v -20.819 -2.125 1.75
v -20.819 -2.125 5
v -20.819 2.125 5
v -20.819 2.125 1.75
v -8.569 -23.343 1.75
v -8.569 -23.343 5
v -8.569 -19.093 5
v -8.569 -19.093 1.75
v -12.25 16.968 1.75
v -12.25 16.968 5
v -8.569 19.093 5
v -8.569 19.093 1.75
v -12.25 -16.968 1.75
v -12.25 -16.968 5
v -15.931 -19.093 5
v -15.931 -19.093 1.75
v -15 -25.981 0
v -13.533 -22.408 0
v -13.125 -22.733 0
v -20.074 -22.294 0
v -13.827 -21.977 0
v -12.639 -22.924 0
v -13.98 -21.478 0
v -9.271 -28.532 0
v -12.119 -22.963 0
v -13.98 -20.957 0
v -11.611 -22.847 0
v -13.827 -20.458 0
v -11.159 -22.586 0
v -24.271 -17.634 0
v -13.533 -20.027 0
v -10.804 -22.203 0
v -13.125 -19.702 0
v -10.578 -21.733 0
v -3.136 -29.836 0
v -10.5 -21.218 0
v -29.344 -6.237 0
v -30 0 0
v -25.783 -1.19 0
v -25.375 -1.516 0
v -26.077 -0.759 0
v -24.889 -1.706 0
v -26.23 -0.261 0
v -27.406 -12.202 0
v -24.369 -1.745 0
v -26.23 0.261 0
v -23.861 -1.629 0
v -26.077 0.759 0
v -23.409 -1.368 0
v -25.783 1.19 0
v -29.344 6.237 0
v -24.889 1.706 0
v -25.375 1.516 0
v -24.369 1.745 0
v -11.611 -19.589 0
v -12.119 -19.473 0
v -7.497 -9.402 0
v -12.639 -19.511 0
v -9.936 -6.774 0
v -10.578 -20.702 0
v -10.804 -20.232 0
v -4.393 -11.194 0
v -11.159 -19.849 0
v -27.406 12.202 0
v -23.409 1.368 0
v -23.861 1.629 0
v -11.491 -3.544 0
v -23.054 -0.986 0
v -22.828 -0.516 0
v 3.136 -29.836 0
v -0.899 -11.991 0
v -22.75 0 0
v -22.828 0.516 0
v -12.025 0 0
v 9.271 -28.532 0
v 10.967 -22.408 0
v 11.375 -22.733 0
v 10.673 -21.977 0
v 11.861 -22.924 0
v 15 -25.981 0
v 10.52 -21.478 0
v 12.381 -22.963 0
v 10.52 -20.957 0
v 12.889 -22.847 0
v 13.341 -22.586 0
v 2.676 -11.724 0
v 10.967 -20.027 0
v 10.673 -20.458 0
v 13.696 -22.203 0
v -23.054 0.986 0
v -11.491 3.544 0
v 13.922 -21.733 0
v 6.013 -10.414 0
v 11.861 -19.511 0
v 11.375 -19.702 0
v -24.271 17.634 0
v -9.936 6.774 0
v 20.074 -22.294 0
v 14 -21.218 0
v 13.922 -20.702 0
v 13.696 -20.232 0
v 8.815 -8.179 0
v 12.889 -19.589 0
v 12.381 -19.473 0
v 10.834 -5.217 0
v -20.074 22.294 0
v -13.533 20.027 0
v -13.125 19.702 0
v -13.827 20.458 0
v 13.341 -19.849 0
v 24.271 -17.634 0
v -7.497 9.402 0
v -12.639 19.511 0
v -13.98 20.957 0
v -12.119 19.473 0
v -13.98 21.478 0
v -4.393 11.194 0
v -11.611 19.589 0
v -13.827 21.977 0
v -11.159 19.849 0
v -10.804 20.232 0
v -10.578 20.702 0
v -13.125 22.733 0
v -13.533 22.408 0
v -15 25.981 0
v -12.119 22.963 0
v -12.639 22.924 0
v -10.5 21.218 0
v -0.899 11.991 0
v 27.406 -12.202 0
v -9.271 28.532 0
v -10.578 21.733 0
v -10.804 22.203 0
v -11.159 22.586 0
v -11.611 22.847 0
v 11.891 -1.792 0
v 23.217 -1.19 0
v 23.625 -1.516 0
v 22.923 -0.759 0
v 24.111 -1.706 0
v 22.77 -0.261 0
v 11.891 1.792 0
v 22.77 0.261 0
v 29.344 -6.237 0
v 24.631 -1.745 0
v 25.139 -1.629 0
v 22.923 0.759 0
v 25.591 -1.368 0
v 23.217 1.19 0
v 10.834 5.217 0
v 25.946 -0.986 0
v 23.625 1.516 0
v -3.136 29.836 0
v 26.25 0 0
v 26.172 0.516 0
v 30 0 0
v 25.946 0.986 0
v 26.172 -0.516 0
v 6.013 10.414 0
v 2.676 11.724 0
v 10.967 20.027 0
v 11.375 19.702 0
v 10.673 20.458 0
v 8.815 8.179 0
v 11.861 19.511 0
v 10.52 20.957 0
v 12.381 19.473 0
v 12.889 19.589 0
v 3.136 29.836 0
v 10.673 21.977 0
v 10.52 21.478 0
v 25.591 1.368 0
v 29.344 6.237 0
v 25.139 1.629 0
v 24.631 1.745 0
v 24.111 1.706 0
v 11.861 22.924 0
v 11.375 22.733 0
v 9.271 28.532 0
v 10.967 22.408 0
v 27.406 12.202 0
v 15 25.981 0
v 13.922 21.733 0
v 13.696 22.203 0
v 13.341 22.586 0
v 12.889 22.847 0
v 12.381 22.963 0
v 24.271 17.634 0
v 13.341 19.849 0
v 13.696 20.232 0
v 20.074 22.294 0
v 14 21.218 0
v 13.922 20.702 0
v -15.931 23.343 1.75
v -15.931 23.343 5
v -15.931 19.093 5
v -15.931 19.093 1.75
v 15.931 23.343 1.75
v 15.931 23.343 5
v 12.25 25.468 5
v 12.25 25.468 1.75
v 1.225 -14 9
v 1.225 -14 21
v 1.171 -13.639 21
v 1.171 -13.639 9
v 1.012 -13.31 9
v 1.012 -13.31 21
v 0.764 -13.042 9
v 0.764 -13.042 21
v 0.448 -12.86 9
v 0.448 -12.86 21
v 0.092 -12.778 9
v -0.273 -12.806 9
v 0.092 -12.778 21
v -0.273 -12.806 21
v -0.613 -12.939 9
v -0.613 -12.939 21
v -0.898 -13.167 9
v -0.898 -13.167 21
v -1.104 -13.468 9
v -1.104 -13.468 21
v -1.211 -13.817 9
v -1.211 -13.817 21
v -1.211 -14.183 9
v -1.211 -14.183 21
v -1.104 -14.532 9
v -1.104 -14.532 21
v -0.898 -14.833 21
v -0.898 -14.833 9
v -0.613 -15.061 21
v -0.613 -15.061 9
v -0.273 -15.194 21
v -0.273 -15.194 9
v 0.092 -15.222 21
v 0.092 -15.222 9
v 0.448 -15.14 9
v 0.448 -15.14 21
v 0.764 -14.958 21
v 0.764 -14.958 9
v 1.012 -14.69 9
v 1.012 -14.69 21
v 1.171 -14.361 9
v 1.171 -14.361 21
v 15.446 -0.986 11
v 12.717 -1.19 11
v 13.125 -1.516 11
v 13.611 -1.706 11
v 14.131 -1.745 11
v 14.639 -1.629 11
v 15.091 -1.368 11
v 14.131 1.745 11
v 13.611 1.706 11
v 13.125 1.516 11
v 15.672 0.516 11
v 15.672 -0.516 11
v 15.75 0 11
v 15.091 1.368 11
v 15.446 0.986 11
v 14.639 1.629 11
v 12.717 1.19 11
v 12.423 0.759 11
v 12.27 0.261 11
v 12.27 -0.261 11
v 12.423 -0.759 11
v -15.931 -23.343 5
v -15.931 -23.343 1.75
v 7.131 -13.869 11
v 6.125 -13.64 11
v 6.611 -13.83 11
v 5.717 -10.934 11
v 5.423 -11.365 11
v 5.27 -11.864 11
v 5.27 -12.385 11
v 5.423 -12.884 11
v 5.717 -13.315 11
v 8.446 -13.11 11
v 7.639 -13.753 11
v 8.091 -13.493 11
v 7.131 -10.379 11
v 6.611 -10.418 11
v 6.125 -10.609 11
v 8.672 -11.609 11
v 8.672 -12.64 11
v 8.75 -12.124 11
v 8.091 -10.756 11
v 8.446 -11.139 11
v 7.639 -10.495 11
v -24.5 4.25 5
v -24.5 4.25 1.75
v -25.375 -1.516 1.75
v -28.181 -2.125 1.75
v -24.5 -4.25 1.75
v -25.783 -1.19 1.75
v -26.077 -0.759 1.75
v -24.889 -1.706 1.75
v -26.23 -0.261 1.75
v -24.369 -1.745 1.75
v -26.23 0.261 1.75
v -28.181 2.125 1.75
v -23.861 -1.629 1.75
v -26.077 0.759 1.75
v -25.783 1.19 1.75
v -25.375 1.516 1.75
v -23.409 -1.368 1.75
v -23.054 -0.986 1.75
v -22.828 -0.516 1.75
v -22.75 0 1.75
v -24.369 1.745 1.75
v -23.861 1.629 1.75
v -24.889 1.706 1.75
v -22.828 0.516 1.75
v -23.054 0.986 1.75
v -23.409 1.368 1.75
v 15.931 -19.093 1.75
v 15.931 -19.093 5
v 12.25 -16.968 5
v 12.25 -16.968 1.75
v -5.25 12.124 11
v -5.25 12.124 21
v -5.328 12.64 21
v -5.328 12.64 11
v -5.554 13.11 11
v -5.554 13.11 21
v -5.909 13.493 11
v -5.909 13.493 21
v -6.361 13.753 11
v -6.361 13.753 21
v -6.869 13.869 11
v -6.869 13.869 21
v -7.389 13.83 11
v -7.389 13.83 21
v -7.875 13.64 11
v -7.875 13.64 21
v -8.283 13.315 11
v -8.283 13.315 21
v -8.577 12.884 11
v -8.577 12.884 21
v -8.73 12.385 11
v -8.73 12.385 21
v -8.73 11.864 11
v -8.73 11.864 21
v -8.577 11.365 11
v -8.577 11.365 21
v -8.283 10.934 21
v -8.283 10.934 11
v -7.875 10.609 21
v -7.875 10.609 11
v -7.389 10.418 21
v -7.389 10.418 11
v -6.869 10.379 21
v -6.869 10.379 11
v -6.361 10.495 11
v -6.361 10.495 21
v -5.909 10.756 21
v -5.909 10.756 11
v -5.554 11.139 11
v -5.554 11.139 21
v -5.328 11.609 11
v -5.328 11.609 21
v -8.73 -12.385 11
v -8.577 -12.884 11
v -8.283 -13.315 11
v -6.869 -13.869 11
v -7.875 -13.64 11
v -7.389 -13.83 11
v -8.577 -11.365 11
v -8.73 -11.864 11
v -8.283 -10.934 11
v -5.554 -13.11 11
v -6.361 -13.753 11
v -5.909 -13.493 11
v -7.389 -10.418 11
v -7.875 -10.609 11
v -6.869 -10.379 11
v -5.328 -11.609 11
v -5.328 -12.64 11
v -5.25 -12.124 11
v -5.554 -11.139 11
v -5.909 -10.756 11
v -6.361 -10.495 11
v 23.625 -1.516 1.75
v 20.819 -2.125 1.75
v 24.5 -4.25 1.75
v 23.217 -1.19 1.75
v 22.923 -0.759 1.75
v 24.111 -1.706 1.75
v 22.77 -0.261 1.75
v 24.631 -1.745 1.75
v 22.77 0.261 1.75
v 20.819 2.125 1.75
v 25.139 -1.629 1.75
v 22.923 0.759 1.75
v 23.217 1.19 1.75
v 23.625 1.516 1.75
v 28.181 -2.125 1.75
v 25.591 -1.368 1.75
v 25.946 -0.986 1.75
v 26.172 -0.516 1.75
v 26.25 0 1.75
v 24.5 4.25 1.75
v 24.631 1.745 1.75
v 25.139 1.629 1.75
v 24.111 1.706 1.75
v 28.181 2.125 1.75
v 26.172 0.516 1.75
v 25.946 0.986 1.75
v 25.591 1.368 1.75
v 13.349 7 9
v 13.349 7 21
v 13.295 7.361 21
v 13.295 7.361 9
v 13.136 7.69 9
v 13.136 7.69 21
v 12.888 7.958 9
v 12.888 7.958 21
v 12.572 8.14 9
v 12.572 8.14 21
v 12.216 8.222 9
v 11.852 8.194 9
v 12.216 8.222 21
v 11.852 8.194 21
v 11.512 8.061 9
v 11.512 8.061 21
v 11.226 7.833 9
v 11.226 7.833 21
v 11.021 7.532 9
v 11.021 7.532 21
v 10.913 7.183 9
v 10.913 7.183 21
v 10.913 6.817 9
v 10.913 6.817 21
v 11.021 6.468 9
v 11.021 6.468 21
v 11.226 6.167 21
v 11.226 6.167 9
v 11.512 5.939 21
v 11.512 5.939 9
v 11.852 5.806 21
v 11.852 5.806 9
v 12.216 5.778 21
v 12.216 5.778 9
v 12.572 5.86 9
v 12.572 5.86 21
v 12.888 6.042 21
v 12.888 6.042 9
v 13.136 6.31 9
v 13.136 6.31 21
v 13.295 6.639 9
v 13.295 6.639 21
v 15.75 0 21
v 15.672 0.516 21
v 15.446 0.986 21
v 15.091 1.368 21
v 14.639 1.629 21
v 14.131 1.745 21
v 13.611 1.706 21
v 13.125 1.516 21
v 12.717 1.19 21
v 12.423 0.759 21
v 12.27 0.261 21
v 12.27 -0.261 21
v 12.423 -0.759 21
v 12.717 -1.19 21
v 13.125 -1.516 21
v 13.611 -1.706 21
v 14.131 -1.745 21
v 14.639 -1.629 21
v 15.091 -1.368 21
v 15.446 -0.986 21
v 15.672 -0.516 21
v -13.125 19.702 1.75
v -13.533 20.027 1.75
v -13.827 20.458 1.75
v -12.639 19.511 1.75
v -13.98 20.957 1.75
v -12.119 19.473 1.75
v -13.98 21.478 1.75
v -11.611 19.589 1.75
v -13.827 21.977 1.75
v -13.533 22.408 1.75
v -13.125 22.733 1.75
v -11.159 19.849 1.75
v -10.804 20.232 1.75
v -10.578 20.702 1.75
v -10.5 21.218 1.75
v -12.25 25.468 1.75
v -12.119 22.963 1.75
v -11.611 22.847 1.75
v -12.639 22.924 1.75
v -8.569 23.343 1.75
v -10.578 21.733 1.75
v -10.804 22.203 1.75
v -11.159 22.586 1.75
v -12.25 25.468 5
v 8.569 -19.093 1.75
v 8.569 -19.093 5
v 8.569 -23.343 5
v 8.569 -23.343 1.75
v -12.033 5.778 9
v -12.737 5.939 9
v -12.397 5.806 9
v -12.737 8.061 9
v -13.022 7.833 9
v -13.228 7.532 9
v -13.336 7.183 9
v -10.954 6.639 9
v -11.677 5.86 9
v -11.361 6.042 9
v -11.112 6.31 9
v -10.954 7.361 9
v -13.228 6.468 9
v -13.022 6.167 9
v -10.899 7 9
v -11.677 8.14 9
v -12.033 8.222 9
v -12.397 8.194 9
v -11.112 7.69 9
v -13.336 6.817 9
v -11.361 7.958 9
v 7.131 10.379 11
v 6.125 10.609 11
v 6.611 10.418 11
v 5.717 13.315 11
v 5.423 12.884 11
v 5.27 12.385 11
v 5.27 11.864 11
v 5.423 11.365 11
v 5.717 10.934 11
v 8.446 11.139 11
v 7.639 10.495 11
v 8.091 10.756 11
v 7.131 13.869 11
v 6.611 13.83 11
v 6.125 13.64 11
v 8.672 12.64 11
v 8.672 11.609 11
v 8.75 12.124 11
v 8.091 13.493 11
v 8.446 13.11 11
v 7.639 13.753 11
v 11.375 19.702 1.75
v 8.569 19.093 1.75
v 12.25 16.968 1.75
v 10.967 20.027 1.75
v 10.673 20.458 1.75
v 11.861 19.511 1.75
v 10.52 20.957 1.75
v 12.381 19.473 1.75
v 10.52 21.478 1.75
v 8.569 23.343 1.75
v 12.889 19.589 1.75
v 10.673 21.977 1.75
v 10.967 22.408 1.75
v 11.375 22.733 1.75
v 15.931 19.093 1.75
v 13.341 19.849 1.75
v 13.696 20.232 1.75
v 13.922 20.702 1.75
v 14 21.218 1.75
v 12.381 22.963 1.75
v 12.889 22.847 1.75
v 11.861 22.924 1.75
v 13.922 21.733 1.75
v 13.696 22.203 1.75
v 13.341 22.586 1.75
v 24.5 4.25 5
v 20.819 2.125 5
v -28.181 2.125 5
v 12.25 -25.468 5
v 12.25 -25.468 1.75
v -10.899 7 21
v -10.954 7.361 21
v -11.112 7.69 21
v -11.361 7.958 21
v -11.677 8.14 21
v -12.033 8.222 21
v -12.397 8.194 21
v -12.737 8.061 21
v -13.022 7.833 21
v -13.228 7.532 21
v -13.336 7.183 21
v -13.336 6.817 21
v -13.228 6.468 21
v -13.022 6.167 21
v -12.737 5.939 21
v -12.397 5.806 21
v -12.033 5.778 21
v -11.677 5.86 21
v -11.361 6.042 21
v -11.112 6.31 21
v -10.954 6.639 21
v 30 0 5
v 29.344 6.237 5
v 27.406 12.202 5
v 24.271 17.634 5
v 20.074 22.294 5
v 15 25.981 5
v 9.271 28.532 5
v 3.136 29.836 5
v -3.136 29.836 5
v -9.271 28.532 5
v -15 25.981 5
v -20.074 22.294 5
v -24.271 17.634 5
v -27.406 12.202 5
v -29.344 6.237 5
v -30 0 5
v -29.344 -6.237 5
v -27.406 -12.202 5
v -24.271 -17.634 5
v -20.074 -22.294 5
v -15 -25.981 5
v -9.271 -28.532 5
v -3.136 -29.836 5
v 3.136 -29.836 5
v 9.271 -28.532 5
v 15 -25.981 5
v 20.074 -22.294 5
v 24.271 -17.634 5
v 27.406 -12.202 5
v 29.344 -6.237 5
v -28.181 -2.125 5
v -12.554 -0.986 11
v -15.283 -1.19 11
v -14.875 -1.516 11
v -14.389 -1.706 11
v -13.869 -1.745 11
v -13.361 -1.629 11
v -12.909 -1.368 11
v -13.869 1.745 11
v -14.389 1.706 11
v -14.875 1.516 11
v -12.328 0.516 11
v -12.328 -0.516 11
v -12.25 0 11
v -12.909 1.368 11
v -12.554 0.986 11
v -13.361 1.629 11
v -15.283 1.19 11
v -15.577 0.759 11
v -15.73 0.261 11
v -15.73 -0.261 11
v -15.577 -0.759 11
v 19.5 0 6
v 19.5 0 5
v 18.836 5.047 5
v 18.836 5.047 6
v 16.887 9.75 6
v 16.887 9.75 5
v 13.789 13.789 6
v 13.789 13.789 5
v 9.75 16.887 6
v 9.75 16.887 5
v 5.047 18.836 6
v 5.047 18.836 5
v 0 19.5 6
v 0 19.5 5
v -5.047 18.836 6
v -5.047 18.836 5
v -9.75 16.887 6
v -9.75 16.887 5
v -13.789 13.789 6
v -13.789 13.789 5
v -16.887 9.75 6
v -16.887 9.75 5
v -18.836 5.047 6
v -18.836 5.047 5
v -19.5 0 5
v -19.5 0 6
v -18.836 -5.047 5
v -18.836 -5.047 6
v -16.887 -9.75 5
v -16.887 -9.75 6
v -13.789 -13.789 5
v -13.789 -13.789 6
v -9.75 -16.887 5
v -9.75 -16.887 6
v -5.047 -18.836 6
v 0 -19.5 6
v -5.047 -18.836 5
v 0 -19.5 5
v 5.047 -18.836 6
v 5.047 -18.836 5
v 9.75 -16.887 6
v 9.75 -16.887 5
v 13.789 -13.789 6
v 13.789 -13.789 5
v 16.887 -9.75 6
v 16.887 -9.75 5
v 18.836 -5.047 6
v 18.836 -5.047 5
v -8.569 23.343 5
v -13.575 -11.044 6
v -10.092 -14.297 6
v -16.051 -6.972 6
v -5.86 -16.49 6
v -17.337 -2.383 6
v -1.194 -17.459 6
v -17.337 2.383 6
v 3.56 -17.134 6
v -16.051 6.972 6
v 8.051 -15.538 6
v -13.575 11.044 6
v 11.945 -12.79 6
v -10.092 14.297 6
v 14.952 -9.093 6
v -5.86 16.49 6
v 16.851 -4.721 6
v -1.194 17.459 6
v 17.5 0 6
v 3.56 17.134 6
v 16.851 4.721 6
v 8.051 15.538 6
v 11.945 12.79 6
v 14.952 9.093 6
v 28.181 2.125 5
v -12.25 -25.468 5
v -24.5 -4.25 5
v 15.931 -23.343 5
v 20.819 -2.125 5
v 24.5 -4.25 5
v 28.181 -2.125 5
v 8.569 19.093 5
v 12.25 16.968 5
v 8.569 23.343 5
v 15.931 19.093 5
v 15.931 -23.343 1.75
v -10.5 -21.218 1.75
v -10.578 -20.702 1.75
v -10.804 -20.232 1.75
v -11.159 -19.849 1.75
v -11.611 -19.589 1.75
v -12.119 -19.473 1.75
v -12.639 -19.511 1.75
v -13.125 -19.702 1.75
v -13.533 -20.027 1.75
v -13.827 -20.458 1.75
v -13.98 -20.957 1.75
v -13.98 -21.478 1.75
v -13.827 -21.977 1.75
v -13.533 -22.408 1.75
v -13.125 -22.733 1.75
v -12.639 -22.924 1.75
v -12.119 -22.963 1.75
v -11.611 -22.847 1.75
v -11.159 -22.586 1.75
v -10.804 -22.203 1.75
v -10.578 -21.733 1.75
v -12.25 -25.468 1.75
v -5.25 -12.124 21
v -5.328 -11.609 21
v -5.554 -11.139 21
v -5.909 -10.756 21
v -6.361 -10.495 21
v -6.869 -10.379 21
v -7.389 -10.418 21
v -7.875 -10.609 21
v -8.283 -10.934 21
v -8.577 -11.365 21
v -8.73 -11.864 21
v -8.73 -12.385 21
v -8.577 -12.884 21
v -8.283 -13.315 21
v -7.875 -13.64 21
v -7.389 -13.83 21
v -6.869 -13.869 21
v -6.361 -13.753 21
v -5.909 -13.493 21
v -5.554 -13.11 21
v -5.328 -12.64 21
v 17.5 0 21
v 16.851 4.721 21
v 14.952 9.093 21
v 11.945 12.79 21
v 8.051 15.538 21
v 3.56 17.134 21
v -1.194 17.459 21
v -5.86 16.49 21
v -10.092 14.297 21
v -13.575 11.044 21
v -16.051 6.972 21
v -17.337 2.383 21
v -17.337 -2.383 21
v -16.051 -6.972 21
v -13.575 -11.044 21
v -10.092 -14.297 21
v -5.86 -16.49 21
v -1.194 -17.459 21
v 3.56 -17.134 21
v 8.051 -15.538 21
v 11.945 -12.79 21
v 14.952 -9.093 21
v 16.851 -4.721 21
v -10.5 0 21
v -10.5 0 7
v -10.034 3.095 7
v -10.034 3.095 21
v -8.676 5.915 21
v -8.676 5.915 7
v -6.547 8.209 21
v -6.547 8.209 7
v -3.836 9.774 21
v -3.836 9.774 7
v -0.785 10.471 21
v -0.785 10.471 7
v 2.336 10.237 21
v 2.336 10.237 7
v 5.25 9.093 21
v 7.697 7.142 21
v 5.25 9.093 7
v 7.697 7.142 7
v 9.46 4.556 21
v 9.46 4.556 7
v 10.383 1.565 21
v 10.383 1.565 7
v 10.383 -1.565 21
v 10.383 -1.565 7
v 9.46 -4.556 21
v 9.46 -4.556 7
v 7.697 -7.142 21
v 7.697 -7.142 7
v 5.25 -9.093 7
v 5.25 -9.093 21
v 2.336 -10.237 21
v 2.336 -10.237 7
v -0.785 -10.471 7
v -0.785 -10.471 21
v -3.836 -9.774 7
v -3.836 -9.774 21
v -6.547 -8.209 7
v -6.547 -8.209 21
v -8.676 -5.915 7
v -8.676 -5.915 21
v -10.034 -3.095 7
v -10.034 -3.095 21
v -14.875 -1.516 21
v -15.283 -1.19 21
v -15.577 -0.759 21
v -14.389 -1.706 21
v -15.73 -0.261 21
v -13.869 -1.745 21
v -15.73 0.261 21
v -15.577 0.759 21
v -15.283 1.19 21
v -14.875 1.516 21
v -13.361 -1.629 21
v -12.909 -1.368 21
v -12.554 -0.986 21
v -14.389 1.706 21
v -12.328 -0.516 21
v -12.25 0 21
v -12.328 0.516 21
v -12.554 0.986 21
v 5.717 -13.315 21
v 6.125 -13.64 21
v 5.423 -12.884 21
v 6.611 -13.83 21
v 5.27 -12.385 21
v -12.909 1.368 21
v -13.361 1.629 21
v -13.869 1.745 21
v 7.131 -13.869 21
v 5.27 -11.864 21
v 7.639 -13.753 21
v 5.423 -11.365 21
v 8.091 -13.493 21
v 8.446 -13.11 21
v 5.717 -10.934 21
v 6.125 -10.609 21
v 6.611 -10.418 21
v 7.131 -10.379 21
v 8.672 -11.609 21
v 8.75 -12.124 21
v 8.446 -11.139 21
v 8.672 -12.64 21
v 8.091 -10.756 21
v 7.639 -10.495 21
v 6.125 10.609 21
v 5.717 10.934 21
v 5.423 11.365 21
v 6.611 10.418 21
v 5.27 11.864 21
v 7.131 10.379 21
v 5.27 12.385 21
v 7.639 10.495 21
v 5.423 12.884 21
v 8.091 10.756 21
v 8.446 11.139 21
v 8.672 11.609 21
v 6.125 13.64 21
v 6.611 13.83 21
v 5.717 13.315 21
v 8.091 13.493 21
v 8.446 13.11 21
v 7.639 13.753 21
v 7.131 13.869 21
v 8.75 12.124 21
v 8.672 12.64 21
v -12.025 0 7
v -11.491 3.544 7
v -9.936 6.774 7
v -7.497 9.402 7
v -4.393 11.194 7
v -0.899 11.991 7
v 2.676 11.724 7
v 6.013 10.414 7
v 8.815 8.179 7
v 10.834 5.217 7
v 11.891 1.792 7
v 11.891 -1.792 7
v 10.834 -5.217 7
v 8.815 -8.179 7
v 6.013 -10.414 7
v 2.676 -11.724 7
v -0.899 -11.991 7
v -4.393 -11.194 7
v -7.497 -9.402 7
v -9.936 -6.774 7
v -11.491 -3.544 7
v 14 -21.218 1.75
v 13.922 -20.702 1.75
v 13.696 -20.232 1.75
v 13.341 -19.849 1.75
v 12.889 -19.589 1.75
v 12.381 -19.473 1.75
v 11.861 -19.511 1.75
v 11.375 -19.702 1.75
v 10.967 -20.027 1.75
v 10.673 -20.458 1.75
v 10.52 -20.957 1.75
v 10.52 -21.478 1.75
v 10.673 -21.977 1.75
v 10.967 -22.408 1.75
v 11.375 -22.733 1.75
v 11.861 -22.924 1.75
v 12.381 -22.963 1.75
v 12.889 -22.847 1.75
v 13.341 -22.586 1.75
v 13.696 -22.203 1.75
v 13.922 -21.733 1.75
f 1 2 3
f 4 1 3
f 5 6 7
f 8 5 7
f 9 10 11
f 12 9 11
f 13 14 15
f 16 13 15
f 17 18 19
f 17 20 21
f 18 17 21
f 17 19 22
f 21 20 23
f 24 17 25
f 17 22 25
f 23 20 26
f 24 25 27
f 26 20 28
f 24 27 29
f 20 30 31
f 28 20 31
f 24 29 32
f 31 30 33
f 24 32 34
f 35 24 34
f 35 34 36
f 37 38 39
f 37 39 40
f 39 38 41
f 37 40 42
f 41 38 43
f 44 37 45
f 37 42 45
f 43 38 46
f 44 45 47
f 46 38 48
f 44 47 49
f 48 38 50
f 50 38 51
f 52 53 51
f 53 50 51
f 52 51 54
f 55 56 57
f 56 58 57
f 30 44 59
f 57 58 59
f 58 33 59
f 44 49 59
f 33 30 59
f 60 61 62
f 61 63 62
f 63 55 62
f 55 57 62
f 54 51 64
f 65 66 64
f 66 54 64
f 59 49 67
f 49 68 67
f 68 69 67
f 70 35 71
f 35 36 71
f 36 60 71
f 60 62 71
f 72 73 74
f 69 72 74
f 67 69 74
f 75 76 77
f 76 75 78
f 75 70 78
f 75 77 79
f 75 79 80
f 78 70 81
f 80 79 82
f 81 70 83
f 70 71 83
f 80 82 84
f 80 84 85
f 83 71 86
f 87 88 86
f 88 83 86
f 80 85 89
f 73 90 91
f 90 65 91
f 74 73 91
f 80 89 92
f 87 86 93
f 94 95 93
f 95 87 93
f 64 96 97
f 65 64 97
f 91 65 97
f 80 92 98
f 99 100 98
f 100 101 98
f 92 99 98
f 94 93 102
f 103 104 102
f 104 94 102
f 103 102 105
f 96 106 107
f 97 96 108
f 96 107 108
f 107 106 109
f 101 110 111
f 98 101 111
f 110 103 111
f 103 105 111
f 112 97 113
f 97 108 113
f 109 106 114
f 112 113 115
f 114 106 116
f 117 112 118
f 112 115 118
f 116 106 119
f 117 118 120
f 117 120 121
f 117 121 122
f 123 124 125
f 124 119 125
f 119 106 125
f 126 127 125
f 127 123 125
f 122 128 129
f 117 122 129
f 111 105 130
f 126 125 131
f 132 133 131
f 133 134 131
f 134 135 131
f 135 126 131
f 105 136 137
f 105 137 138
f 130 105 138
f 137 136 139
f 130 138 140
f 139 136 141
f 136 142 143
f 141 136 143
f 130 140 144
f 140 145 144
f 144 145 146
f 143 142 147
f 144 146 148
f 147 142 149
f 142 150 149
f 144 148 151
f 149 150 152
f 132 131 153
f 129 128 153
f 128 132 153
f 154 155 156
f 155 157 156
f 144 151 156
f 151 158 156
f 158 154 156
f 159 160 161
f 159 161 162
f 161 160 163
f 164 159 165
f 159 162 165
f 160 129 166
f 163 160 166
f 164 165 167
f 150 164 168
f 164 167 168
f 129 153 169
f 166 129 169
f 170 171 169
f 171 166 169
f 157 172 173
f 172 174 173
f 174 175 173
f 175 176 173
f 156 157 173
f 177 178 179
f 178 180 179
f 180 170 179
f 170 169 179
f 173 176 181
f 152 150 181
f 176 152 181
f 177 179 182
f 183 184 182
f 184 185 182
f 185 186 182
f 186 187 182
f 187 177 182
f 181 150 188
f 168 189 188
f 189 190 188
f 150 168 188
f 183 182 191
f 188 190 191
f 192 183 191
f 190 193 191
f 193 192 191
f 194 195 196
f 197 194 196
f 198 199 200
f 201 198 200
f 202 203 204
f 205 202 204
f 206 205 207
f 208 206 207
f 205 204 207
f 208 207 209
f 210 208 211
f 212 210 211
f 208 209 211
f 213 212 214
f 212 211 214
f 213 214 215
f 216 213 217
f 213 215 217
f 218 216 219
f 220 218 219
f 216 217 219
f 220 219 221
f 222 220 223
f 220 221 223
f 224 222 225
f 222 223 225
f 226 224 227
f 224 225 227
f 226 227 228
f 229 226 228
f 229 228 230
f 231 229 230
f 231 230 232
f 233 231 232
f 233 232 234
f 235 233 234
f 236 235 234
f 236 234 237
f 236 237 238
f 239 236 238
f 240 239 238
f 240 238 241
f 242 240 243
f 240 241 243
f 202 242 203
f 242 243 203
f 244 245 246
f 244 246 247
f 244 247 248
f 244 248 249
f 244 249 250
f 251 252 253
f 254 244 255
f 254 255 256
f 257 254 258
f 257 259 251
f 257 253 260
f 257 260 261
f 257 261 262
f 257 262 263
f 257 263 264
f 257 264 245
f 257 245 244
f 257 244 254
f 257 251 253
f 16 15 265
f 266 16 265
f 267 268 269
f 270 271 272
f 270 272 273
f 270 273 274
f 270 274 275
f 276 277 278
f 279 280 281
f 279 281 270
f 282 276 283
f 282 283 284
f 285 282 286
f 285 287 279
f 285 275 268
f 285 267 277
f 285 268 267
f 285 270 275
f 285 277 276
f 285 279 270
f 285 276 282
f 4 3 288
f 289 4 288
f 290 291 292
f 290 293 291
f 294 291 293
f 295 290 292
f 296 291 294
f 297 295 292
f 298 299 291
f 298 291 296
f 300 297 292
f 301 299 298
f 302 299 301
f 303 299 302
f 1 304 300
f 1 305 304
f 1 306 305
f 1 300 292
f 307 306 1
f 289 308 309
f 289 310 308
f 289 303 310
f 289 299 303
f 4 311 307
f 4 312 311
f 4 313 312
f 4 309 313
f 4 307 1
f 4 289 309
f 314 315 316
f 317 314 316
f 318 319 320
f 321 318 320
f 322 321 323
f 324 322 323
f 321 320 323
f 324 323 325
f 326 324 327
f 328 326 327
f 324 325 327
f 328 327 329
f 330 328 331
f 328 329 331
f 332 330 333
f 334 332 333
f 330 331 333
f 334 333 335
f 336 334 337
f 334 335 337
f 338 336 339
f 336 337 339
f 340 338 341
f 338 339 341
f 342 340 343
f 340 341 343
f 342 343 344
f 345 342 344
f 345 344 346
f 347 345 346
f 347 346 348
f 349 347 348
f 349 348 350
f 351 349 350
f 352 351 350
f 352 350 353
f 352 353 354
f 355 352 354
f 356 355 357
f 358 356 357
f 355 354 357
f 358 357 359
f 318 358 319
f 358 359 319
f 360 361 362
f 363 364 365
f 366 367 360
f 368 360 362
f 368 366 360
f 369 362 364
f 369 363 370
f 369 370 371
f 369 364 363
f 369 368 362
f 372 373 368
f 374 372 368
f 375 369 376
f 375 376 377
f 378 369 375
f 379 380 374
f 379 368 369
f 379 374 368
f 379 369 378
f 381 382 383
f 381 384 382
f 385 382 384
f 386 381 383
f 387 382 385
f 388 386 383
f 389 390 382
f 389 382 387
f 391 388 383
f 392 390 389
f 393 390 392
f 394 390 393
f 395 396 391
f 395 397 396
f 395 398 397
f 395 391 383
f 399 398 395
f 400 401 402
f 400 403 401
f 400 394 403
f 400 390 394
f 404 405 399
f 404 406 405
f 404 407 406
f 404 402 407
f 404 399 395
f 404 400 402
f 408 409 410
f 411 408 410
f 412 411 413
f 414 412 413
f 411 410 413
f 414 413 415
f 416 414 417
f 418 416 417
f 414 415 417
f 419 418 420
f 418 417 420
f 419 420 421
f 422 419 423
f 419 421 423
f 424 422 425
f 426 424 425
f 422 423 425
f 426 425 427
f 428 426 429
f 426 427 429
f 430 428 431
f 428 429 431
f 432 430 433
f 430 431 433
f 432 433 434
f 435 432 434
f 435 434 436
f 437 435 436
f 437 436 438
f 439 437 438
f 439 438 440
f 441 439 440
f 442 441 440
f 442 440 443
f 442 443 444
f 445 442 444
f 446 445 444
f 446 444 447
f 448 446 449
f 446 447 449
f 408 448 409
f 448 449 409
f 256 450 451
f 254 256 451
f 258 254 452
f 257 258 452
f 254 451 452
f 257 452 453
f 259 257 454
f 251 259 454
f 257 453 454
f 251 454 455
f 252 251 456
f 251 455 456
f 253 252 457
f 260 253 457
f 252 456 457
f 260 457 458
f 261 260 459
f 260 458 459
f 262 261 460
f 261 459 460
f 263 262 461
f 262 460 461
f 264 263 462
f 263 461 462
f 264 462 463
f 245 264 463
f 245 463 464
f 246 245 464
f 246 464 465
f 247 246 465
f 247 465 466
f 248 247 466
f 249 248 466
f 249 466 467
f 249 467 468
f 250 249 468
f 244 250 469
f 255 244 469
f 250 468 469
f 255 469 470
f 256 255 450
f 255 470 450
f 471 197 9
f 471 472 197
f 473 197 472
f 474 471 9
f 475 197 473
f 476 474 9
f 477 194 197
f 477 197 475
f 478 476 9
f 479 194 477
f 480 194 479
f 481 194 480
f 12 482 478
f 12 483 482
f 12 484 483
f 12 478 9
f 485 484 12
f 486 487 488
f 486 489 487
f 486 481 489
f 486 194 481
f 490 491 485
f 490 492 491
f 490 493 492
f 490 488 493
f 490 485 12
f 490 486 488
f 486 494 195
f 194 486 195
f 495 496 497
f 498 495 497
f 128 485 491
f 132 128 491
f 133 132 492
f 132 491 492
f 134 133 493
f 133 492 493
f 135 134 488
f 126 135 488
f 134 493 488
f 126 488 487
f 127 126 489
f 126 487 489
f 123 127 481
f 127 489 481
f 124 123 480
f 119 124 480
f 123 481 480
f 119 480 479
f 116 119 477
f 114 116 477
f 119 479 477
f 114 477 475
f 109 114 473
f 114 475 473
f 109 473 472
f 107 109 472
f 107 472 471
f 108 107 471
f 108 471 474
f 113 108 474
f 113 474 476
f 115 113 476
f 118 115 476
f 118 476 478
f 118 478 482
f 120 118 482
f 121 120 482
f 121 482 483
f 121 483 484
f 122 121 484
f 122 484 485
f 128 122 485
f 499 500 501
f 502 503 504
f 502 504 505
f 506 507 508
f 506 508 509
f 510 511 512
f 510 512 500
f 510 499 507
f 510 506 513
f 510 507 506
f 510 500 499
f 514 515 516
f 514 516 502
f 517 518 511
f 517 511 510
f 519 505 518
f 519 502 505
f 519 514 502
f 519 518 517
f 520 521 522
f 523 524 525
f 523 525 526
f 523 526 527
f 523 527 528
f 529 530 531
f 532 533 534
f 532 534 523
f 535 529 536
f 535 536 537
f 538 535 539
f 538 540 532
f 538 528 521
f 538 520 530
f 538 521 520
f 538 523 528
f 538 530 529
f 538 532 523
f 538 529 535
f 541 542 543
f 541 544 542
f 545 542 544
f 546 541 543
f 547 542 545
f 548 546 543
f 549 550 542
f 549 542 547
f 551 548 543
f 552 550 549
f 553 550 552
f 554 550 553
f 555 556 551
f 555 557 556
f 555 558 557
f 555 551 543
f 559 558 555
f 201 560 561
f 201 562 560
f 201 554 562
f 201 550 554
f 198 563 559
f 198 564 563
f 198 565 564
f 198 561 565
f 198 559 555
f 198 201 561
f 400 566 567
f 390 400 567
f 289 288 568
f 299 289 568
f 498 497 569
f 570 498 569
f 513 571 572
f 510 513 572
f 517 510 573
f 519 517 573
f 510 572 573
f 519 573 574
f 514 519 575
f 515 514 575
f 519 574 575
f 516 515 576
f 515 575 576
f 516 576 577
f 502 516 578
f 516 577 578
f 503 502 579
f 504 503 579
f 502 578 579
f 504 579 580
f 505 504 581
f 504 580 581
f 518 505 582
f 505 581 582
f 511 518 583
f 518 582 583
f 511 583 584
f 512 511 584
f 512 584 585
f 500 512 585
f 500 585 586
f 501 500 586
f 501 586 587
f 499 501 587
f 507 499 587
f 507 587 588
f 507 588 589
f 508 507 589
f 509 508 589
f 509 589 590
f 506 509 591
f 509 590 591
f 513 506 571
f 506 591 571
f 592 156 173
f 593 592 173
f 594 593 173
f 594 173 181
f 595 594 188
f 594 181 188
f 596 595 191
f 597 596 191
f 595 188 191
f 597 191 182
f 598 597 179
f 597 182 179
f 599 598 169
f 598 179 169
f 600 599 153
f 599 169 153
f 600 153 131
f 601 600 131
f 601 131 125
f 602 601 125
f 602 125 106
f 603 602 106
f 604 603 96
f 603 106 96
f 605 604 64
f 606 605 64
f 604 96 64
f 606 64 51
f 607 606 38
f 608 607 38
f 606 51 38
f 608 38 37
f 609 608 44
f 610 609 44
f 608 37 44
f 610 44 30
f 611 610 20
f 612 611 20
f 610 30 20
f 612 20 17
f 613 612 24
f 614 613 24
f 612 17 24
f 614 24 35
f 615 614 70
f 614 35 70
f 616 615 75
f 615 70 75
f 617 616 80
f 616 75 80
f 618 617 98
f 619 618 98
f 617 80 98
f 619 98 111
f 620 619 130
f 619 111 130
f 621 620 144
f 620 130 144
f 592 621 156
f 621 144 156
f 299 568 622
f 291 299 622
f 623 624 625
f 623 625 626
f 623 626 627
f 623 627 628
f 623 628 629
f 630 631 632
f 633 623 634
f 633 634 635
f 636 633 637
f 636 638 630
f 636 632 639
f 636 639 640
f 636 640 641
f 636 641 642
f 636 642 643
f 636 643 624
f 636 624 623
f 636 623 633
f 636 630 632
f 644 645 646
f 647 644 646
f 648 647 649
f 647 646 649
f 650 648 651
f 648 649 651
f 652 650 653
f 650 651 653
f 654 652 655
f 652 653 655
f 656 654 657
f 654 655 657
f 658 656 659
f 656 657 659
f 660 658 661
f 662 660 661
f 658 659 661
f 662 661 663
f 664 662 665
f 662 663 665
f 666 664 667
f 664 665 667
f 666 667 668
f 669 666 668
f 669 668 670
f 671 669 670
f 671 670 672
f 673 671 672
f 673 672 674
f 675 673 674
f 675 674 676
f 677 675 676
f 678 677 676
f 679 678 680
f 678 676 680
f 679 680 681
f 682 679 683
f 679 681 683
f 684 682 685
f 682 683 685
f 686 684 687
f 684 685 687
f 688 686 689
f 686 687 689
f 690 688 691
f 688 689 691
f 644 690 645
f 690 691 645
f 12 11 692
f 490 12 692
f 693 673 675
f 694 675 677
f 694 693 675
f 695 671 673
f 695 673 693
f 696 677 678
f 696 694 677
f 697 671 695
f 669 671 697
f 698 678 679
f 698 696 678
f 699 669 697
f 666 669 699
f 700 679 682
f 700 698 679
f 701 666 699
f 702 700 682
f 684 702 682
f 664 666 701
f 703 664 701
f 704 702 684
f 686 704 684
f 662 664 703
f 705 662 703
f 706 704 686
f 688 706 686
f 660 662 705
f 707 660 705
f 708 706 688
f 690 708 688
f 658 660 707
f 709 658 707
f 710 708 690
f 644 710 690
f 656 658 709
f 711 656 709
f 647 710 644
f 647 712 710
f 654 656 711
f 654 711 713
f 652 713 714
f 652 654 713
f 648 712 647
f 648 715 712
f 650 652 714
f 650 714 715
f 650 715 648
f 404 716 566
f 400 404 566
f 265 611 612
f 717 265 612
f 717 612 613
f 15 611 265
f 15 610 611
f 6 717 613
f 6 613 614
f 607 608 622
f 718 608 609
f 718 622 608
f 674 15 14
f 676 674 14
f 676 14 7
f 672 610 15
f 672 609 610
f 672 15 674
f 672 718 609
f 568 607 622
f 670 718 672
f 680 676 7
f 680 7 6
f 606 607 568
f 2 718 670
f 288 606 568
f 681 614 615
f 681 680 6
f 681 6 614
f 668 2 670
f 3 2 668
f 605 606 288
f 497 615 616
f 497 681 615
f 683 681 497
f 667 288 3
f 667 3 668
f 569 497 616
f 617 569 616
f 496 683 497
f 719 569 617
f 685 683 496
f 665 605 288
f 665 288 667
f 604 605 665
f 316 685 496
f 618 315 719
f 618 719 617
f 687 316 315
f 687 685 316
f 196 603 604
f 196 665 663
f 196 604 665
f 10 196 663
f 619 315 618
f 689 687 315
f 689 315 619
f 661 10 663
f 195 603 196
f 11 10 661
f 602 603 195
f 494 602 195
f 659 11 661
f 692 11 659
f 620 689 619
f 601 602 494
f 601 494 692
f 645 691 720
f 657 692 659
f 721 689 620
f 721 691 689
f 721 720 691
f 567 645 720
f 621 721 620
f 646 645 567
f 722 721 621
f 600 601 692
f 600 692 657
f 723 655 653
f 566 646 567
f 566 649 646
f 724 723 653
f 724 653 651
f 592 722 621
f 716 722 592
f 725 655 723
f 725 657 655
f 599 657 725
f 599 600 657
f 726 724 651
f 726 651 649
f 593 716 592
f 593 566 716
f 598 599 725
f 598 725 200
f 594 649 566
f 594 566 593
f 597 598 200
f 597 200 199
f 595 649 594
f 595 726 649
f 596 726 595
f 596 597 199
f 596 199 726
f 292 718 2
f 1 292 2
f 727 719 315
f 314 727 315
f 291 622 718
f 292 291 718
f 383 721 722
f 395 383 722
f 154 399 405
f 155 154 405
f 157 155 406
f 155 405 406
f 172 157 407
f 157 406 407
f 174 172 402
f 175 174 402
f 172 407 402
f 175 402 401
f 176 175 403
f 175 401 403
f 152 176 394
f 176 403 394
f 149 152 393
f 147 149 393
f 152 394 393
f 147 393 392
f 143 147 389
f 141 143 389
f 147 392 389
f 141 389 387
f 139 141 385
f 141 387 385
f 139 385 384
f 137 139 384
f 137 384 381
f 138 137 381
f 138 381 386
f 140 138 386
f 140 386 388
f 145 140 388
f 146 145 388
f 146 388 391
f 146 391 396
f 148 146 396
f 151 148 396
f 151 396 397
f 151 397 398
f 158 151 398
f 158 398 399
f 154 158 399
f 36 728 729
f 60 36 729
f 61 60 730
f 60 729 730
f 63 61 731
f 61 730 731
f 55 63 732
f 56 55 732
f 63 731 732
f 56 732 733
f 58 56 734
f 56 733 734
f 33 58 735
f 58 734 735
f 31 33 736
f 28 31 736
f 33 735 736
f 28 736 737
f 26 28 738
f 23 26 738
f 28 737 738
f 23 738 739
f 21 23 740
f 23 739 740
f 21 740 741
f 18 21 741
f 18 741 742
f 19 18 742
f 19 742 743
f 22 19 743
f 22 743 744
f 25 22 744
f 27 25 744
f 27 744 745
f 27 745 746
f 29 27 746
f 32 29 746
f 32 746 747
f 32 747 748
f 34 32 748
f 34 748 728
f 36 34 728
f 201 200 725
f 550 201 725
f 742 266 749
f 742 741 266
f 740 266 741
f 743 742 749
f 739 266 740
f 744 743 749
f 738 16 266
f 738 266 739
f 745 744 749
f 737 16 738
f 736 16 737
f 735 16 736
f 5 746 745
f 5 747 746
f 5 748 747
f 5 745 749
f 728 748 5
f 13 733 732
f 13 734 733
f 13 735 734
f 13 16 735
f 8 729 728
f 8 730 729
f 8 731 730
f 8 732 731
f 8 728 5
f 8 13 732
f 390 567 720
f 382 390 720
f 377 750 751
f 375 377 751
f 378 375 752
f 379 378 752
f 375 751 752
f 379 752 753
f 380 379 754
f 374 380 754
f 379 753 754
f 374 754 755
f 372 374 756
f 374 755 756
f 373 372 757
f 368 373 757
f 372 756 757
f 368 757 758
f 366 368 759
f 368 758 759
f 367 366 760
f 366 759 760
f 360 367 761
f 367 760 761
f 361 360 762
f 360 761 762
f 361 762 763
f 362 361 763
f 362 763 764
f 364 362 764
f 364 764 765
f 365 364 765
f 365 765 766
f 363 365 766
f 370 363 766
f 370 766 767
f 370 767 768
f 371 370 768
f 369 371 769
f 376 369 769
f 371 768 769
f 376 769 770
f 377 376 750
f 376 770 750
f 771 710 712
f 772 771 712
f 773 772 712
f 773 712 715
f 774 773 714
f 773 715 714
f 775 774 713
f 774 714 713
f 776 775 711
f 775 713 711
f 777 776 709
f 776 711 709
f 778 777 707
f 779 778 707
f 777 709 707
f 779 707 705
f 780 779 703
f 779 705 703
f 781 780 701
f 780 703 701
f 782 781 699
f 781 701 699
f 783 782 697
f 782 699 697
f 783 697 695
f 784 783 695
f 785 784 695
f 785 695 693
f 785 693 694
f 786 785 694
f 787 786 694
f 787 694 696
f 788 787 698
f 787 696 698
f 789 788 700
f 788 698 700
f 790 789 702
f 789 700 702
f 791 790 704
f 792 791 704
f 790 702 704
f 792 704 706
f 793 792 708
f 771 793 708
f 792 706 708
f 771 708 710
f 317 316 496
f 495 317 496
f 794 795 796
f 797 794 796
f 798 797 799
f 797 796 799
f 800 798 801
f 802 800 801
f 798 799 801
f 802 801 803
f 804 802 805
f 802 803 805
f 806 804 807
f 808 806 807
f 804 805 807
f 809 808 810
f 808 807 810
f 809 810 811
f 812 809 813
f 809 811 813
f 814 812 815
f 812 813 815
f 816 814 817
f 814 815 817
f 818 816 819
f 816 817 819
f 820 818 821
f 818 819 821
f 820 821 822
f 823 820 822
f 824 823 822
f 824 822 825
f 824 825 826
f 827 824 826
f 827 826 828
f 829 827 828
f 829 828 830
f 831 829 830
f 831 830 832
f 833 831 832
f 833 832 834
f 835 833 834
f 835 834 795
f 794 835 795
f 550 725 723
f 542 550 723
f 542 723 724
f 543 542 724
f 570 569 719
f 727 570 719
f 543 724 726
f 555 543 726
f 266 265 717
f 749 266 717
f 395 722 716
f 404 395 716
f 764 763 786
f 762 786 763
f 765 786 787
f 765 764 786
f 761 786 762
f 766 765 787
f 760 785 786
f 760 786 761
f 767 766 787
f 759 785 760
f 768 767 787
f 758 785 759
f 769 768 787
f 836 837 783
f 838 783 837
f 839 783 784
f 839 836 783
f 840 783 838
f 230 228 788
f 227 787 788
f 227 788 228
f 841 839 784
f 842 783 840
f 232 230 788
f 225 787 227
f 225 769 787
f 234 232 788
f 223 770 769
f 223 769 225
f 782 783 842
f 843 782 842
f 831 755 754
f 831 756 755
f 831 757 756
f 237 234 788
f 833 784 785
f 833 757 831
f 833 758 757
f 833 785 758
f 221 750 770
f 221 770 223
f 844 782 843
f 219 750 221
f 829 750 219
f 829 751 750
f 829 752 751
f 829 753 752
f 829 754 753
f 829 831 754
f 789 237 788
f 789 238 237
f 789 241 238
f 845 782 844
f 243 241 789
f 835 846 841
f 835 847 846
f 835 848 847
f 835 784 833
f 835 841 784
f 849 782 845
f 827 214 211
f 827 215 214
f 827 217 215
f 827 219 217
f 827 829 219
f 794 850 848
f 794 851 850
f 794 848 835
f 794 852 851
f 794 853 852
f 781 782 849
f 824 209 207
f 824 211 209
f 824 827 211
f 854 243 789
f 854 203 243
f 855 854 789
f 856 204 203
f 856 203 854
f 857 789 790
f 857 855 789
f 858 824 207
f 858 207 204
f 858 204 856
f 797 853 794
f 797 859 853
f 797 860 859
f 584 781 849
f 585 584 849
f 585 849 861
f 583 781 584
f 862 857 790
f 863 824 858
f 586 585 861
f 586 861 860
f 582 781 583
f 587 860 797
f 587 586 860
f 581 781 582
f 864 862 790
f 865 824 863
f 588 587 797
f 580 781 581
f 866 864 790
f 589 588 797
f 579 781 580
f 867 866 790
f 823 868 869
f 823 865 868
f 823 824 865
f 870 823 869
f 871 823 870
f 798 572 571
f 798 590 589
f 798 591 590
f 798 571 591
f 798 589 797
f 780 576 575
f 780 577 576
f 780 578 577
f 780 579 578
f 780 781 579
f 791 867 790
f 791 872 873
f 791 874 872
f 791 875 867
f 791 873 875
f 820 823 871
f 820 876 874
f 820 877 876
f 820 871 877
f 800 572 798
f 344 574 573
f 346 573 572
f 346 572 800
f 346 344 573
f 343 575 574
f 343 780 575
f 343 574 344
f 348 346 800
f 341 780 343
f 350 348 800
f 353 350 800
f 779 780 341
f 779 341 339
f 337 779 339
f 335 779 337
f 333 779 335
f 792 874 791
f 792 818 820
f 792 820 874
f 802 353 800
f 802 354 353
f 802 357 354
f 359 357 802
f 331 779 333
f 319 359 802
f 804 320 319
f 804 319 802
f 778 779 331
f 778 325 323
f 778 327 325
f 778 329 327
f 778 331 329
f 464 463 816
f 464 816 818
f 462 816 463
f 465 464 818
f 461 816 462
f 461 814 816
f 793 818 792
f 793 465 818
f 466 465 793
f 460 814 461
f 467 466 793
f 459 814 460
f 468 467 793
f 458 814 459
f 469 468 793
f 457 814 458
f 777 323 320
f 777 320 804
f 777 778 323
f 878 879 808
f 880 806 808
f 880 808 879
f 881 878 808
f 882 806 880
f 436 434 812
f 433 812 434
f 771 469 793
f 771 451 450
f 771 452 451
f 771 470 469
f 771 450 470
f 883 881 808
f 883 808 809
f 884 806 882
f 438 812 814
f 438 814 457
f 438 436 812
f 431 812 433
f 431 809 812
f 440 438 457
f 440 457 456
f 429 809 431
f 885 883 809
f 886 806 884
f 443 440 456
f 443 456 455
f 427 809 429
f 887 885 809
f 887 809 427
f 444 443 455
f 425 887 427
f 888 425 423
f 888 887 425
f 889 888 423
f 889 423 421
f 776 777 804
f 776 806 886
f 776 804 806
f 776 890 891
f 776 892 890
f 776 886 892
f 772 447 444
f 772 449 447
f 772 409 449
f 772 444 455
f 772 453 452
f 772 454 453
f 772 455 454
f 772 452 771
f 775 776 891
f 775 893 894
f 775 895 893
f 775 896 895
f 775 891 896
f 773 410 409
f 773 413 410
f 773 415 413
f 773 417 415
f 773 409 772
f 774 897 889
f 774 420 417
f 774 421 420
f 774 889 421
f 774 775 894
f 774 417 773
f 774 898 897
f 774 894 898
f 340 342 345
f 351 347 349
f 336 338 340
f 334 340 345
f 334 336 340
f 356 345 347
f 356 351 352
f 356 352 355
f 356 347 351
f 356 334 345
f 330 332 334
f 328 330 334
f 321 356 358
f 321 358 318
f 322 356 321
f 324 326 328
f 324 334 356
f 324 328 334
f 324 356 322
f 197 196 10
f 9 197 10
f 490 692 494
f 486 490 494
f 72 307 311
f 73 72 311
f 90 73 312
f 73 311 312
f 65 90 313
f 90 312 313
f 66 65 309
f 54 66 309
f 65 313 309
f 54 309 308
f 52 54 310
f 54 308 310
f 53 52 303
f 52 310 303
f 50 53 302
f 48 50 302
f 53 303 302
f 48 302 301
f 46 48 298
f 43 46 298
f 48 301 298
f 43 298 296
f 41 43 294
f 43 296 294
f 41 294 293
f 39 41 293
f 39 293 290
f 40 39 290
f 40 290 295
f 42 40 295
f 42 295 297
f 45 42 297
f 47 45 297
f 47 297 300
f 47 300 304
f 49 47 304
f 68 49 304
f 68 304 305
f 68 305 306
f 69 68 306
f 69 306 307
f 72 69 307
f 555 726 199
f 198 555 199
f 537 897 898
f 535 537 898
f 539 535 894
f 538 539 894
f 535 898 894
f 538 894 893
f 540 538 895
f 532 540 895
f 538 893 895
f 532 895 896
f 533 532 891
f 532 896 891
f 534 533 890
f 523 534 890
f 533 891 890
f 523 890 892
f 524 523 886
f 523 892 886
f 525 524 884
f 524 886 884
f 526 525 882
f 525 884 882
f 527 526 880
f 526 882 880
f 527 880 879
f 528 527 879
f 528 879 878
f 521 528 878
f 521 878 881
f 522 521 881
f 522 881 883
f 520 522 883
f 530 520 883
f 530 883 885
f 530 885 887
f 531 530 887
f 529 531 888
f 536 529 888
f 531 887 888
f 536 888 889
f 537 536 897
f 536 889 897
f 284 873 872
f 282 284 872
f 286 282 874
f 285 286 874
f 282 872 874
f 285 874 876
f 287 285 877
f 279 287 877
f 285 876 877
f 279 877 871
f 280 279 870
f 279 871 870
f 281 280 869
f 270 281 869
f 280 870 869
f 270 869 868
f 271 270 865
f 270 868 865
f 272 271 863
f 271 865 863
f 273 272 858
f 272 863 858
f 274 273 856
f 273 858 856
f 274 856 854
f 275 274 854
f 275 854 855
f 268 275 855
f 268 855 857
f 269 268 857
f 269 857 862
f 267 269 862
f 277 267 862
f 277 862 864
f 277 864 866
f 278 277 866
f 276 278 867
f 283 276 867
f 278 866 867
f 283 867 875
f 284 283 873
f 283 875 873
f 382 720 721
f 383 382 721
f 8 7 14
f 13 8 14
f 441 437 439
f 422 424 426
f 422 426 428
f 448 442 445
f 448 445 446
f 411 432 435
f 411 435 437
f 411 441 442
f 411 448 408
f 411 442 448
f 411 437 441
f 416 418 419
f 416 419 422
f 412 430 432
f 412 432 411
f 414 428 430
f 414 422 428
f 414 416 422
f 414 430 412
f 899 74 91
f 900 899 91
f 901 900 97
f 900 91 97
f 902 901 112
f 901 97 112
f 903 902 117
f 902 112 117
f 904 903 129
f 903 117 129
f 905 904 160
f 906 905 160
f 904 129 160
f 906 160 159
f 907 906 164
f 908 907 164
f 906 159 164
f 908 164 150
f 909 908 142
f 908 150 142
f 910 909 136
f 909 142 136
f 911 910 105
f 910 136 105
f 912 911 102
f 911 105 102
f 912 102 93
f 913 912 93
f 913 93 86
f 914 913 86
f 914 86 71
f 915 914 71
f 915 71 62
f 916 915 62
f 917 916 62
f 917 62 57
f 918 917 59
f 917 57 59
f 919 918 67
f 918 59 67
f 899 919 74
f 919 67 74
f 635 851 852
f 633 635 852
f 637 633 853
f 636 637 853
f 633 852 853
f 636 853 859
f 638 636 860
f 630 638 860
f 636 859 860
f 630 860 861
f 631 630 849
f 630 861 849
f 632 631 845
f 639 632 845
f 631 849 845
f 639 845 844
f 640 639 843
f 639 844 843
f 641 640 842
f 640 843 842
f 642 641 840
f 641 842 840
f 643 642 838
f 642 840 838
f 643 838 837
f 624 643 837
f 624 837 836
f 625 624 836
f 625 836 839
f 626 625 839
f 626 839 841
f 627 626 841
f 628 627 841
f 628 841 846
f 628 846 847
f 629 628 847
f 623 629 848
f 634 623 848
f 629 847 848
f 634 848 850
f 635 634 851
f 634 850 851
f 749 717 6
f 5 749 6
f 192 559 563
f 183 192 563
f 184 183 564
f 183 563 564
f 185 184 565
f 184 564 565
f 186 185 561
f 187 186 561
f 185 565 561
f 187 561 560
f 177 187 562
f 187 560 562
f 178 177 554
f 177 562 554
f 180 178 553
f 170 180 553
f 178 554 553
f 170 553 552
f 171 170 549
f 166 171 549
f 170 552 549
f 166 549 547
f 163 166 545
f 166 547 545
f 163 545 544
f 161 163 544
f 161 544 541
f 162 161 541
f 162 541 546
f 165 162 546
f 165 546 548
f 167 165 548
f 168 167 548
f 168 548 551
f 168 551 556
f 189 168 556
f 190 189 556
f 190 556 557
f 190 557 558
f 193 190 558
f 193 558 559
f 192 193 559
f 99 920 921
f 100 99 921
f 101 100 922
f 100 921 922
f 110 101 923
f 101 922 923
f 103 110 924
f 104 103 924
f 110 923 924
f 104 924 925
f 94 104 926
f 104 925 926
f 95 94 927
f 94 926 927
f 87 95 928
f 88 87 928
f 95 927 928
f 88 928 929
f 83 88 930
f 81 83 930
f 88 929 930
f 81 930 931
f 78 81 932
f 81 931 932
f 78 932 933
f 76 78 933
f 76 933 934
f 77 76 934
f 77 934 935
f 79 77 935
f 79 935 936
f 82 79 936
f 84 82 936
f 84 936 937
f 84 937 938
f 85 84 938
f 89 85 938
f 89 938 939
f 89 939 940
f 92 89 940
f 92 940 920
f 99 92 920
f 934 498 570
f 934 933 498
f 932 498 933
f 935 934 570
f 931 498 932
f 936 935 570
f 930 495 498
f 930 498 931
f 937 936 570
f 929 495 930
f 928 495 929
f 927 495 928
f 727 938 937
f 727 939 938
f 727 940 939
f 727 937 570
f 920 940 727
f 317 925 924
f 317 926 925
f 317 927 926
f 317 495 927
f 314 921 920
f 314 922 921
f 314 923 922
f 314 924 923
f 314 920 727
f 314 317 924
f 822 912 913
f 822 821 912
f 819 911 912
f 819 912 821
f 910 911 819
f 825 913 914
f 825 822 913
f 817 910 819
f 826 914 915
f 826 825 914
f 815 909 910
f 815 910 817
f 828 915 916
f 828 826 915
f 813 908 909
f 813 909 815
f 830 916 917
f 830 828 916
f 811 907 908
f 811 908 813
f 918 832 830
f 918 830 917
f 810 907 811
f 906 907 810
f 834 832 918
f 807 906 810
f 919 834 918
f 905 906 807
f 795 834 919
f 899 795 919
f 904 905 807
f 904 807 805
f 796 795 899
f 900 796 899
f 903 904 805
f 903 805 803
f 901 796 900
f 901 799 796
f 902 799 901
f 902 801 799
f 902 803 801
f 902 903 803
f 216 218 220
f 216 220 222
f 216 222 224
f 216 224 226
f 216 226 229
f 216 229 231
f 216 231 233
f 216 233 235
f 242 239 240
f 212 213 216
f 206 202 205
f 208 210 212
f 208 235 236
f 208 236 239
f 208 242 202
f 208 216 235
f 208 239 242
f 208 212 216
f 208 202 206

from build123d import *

# Parameters (mm, degrees)
SKETCH1_R           = 30
BOSS_EXTRUDE1_DEPTH = 5
SKETCH2_R           = 19.5
BOSS_EXTRUDE2_DEPTH = 1
SKETCH3_R           = 17.5
BOSS_EXTRUDE3_DEPTH = 15
SKETCH4_R           = 12.025
CUT_EXTRUDE1_DEPTH  = 7
SKETCH5_R           = 10.5
CUT_EXTRUDE2_DEPTH  = 45.676615807
SKETCH6_R           = 1.75
CUT_EXTRUDE3_DEPTH  = 46.343136195
SKETCH7_R           = 1.75
CUT_EXTRUDE4_DEPTH  = 10
SKETCH8_R           = 1.225
CUT_EXTRUDE5_DEPTH  = 12
CUT_EXTRUDE6_DEPTH  = 3.25


with BuildPart() as part:
    # Sketch1 → Boss-Extrude1 (new body)
    with BuildSketch(Plane.XY):
        Circle(SKETCH1_R)
    extrude(amount=BOSS_EXTRUDE1_DEPTH)

    # Sketch2 → Boss-Extrude2 (add)
    with BuildSketch(Plane.XY.offset(5)):
        Circle(SKETCH2_R)
    extrude(amount=BOSS_EXTRUDE2_DEPTH)

    # Sketch3 → Boss-Extrude3 (add)
    with BuildSketch(Plane.XY.offset(6)):
        Circle(SKETCH3_R)
    extrude(amount=BOSS_EXTRUDE3_DEPTH)

    # Sketch4 → Cut-Extrude1 (cut)
    with BuildSketch(Plane(origin=(0, 0, 0), x_dir=(-1, 0, 0), z_dir=(0, 0, -1))):
        Circle(SKETCH4_R)
    extrude(amount=-CUT_EXTRUDE1_DEPTH, mode=Mode.SUBTRACT)

    # Sketch5 → Cut-Extrude2 (cut, through all)
    with BuildSketch(Plane(origin=(0, 0, 7), x_dir=(-1, 0, 0), z_dir=(0, 0, -1))):
        Circle(SKETCH5_R)
    extrude(amount=-CUT_EXTRUDE2_DEPTH, mode=Mode.SUBTRACT)

    # Sketch6 → Cut-Extrude3 (cut, through all)
    with BuildSketch(Plane.XY.offset(5)):
        with Locations((24.5, 0)):
            Circle(SKETCH6_R)
        with Locations((12.25, -21.217622393)):
            Circle(SKETCH6_R)
        with Locations((-12.25, -21.217622393)):
            Circle(SKETCH6_R)
        with Locations((-24.5, 0)):
            Circle(SKETCH6_R)
        with Locations((-12.25, 21.217622393)):
            Circle(SKETCH6_R)
        with Locations((12.25, 21.217622393)):
            Circle(SKETCH6_R)
    extrude(amount=-CUT_EXTRUDE3_DEPTH, mode=Mode.SUBTRACT)

    # Sketch7 → Cut-Extrude4 (cut)
    with BuildSketch(Plane.XY.offset(21)):
        with Locations((14, 0)):
            Circle(SKETCH7_R)
        with Locations((7, -12.124355653)):
            Circle(SKETCH7_R)
        with Locations((-7, -12.124355653)):
            Circle(SKETCH7_R)
        with Locations((-14, 0)):
            Circle(SKETCH7_R)
        with Locations((-7, 12.124355653)):
            Circle(SKETCH7_R)
        with Locations((7, 12.124355653)):
            Circle(SKETCH7_R)
    extrude(amount=-CUT_EXTRUDE4_DEPTH, mode=Mode.SUBTRACT)

    # Sketch8 → Cut-Extrude5 (cut)
    with BuildSketch(Plane.XY.offset(21)):
        with Locations((12.124355653, 7)):
            Circle(SKETCH8_R)
        with Locations((0, -14)):
            Circle(SKETCH8_R)
        with Locations((-12.124355653, 7)):
            Circle(SKETCH8_R)
    extrude(amount=-CUT_EXTRUDE5_DEPTH, mode=Mode.SUBTRACT)

    # Sketch9 → Cut-Extrude6 (cut)
    with BuildSketch(Plane.XY.offset(5)):
        Polygon((12.25, -16.967622393), (8.569392034, -19.092622393), (8.569392034, -23.342622393), (12.25, -25.467622393), (15.930607966, -23.342622393), (15.930607966, -19.092622393), align=None)
        Polygon((24.5, 4.25), (20.819392034, 2.125), (20.819392034, -2.125), (24.5, -4.25), (28.180607966, -2.125), (28.180607966, 2.125), align=None)
        Polygon((-8.569392034, -19.092622393), (-12.25, -16.967622393), (-15.930607966, -19.092622393), (-15.930607966, -23.342622393), (-12.25, -25.467622393), (-8.569392034, -23.342622393), align=None)
        Polygon((-20.819392034, -2.125), (-20.819392034, 2.125), (-24.5, 4.25), (-28.180607966, 2.125), (-28.180607966, -2.125), (-24.5, -4.25), align=None)
        Polygon((-12.25, 16.967622393), (-8.569392034, 19.092622393), (-8.569392034, 23.342622393), (-12.25, 25.467622393), (-15.930607966, 23.342622393), (-15.930607966, 19.092622393), align=None)
        Polygon((8.569392034, 19.092622393), (12.25, 16.967622393), (15.930607966, 19.092622393), (15.930607966, 23.342622393), (12.25, 25.467622393), (8.569392034, 23.342622393), align=None)
    extrude(amount=-CUT_EXTRUDE6_DEPTH, mode=Mode.SUBTRACT)


solid = part.part
